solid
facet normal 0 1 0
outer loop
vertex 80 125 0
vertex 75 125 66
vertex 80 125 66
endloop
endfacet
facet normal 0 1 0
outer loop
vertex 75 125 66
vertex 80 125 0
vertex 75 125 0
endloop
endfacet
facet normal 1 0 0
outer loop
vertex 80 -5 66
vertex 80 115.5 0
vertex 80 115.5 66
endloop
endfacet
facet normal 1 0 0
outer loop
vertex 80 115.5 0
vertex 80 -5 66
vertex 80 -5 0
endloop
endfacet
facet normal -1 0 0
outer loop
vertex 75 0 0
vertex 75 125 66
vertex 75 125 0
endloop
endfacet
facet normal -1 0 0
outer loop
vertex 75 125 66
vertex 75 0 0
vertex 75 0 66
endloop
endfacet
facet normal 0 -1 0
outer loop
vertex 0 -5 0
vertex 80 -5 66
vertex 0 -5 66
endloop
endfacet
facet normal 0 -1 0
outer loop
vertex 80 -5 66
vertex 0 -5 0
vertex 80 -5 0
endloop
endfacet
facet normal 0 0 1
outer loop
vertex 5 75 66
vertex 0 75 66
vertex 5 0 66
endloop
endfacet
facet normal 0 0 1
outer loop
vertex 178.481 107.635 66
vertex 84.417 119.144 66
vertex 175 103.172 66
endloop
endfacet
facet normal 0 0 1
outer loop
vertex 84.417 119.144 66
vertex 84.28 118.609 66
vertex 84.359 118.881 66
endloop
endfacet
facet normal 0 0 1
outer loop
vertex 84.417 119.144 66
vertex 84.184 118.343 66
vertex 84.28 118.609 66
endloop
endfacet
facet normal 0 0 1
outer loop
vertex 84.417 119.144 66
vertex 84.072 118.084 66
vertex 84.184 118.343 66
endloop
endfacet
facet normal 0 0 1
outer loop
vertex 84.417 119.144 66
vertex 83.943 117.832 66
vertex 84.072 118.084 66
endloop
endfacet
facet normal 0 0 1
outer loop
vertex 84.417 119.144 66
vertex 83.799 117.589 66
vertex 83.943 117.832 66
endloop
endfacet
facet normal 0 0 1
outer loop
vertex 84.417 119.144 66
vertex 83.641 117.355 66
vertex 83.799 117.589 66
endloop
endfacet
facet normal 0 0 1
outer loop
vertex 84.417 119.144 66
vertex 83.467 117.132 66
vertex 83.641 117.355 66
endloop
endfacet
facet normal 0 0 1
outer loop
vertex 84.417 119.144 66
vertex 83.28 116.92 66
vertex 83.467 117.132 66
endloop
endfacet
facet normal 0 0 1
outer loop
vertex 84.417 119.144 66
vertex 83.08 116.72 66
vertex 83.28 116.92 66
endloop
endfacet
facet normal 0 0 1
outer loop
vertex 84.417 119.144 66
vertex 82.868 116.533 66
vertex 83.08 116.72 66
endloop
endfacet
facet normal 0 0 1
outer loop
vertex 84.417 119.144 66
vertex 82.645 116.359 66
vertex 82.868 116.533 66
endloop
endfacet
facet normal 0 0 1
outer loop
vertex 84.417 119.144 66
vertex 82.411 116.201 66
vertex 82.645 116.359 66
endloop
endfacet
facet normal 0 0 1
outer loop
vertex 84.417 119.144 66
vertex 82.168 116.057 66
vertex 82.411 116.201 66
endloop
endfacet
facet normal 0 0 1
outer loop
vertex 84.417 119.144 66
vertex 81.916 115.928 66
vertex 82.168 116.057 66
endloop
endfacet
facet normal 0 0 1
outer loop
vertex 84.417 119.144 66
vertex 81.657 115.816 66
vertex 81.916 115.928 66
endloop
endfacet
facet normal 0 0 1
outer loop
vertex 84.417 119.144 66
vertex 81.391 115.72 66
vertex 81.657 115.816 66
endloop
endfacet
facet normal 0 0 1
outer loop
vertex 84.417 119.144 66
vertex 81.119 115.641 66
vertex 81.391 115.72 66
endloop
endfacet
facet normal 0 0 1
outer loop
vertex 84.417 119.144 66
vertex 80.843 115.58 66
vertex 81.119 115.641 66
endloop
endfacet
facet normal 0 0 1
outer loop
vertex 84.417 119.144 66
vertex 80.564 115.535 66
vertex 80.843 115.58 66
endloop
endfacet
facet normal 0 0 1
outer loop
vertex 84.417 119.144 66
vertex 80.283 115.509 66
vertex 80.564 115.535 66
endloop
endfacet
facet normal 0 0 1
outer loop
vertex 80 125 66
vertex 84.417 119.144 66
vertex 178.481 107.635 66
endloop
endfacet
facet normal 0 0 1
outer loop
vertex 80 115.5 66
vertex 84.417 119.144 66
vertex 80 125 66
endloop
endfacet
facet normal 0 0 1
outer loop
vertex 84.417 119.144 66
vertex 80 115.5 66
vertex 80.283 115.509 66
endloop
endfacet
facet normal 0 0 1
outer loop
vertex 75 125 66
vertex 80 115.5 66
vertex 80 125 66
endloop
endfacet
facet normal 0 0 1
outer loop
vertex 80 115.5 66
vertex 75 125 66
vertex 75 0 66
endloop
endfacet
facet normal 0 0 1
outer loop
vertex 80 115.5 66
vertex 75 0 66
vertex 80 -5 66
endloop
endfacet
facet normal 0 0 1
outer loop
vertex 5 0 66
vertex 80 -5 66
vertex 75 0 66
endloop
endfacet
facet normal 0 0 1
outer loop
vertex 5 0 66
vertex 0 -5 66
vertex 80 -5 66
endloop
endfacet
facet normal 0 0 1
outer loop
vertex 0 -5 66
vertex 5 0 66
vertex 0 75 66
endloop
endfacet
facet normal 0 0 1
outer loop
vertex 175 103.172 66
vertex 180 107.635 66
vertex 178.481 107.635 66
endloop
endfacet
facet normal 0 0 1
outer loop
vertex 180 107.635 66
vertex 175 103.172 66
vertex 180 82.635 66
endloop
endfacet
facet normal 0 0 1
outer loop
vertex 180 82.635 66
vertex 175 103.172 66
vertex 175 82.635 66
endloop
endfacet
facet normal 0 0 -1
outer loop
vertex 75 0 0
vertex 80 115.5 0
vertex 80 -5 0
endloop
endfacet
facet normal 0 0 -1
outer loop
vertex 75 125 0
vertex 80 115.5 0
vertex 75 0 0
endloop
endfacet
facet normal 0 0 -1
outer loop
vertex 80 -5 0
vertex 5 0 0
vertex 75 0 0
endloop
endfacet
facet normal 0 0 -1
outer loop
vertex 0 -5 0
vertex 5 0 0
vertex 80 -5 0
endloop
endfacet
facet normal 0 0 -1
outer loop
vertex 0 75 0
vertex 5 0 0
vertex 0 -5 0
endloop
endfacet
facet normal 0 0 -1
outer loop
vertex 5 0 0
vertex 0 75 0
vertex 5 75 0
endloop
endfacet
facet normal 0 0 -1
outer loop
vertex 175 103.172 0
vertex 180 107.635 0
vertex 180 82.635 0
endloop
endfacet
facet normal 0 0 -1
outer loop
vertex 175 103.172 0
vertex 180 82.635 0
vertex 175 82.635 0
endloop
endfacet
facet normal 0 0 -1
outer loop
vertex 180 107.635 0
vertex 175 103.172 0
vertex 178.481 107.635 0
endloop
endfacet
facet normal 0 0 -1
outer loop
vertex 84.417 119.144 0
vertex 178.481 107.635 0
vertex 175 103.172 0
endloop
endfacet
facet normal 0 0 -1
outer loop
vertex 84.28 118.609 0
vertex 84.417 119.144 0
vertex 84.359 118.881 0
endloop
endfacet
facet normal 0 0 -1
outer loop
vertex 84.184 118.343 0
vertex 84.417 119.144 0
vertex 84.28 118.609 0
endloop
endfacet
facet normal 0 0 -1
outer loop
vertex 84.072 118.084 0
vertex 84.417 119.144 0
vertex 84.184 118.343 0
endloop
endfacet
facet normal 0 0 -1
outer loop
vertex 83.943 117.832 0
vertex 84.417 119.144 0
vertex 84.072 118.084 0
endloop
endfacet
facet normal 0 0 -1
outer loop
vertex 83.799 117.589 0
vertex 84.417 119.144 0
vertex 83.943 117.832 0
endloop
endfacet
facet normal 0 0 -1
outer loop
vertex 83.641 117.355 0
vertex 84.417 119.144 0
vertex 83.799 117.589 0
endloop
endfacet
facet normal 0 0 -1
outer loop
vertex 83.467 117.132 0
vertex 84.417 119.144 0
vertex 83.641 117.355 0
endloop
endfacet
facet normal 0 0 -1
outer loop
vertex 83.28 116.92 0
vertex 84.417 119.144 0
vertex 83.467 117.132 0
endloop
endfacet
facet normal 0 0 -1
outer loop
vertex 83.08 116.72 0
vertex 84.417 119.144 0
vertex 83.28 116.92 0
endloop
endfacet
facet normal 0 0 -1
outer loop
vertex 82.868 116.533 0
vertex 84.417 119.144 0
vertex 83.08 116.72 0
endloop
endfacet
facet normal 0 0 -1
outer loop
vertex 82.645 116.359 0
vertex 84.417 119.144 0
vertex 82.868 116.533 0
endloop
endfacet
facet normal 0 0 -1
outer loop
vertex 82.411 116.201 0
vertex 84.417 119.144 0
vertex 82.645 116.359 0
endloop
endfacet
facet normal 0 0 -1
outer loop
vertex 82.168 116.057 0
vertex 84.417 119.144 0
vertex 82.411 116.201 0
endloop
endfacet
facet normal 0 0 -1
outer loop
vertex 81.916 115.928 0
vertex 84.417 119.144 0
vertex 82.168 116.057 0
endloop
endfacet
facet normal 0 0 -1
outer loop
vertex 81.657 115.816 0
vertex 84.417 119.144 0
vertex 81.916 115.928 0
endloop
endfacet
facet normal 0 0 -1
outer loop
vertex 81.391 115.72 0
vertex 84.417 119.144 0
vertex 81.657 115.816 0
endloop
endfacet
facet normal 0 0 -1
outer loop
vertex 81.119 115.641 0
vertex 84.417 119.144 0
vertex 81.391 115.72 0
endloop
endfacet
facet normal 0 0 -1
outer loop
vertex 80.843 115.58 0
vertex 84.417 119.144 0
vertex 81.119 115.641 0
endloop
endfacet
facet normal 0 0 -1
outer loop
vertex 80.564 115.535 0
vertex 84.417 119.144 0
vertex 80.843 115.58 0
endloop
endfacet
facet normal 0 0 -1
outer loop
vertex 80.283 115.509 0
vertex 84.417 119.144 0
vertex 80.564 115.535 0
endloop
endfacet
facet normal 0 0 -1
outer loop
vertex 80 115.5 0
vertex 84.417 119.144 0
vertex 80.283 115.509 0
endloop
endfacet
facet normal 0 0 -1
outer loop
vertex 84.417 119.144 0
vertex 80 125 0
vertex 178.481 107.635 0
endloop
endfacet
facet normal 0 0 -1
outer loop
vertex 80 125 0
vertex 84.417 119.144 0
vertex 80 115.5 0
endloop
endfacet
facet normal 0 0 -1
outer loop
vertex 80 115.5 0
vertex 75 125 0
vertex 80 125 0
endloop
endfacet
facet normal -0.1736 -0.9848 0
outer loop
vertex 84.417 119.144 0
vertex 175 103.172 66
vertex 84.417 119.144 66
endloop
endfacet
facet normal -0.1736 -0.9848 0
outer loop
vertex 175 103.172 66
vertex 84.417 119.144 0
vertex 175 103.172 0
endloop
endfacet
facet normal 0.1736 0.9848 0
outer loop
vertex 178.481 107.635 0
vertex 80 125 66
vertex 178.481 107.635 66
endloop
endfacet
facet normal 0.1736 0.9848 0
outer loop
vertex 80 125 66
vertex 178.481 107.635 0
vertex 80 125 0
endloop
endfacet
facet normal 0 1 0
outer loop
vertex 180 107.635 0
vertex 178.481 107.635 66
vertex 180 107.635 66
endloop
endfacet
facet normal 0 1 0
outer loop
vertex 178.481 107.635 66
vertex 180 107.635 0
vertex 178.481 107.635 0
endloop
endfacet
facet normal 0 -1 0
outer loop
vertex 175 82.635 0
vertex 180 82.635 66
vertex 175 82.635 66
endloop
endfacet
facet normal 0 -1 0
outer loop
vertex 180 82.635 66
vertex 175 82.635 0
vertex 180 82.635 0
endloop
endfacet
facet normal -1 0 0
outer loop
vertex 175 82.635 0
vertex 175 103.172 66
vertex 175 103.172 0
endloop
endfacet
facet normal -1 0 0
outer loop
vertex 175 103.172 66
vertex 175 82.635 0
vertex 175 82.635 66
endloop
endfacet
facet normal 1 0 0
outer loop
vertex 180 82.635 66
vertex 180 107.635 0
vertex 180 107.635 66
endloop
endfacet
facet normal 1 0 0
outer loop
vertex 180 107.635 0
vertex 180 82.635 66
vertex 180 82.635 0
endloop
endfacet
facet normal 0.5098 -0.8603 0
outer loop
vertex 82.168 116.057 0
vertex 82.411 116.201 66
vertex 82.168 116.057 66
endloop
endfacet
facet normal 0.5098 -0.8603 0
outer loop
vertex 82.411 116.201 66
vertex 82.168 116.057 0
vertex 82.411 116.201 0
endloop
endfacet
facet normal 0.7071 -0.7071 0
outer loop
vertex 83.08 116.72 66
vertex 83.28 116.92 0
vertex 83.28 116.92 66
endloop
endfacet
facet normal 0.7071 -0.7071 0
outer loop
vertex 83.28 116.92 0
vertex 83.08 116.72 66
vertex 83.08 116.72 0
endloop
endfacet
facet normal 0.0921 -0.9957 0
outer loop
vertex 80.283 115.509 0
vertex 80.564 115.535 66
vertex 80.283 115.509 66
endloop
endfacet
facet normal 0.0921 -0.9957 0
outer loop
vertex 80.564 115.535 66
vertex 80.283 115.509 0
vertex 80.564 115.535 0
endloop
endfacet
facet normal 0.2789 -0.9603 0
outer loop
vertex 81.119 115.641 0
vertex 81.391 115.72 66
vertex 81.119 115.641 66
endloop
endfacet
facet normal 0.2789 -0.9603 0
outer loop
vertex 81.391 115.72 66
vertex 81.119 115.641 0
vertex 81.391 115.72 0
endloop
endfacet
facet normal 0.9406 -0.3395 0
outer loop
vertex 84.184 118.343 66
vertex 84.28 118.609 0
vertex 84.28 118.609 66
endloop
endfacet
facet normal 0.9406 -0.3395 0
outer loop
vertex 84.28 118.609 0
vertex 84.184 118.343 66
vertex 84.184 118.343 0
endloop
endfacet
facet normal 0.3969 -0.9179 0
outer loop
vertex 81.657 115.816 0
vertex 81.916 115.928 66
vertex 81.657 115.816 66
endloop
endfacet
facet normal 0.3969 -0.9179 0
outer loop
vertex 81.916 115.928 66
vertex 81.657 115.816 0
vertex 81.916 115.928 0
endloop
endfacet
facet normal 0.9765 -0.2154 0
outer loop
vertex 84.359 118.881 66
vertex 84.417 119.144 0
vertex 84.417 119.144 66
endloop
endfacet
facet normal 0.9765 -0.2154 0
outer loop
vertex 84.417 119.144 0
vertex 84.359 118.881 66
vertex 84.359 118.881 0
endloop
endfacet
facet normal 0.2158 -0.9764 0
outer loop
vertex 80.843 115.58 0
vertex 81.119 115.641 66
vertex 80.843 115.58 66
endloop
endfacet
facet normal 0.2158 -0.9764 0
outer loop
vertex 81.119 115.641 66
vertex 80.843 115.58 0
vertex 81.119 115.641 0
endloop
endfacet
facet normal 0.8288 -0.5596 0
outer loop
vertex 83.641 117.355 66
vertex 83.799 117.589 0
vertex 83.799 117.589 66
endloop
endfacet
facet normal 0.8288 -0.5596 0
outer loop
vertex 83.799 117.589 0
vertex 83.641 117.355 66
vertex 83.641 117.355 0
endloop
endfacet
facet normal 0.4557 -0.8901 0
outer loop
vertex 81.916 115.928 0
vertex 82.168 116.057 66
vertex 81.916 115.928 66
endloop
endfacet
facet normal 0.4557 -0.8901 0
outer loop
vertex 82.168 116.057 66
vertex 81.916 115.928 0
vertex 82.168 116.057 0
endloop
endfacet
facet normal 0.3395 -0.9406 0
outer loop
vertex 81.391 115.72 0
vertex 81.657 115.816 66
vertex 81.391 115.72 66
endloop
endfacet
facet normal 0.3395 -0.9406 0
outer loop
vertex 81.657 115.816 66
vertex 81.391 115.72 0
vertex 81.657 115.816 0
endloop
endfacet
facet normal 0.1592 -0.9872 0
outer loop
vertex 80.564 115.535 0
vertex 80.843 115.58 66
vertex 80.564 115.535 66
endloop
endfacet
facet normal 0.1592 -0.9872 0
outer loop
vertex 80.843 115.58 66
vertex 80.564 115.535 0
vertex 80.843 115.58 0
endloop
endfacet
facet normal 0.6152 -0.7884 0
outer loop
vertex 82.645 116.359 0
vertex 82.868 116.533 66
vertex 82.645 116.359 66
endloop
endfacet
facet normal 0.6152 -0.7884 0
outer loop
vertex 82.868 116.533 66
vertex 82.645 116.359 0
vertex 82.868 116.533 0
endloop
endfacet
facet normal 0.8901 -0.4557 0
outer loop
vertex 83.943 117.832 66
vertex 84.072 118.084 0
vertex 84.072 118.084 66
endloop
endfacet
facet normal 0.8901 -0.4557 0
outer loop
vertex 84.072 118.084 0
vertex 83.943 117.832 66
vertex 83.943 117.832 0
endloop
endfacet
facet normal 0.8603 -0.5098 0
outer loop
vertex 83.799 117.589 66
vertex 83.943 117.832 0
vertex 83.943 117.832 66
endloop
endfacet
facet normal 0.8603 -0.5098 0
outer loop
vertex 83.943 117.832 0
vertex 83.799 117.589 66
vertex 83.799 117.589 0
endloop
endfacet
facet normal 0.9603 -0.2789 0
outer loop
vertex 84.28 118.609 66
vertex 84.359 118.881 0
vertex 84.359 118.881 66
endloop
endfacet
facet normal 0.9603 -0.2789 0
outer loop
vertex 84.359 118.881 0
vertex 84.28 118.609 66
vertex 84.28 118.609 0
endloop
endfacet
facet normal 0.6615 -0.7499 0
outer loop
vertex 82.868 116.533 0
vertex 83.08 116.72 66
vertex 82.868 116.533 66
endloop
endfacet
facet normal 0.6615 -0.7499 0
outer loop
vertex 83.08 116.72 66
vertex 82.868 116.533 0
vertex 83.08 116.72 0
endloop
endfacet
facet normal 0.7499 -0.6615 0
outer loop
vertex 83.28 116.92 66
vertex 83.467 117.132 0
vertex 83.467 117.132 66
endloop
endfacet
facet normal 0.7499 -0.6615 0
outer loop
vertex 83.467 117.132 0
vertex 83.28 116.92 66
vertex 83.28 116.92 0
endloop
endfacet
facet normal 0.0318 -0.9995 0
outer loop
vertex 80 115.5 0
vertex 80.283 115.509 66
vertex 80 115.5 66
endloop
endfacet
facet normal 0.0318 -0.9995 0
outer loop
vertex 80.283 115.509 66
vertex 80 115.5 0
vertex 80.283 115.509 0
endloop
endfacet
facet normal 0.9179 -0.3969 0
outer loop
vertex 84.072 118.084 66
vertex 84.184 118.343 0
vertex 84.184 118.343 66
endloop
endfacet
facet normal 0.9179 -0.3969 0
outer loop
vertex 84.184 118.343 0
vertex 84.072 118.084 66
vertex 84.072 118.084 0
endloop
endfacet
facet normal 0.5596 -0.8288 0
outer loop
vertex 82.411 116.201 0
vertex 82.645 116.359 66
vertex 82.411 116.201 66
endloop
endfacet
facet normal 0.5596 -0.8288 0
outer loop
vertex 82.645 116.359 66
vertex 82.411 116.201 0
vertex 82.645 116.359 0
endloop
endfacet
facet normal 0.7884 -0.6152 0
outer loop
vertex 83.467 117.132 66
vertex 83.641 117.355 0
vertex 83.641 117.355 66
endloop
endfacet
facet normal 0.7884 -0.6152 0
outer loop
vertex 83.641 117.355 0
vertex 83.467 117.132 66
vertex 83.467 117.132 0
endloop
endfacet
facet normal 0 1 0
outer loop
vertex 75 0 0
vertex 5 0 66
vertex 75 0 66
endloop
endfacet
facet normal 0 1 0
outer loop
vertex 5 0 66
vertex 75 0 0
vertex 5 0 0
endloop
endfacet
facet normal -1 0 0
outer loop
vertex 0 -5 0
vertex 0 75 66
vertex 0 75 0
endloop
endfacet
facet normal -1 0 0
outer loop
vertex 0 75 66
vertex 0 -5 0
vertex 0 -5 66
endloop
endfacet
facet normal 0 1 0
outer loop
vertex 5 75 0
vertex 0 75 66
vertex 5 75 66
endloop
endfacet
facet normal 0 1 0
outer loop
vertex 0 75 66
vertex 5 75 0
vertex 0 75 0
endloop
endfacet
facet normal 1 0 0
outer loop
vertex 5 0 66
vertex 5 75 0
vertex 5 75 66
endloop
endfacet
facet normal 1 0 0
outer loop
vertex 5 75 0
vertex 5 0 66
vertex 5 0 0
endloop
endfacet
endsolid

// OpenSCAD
hookwidth = 66;		// witdh of hook
hookthick = 5;		// thickness of part
hooktop = 75;		// length of top we hang on
hooklatch = 100;		// length of overhang latch (twice as long on hanger side)
hookfront = 125;
hookback = 75;
hooktip = 25;

rotate ([90,0,0]) union () 
{
	cube ([hooktop,hookwidth,hookthick]);
	rotate ([0,90,0]) cube ([hookback,hookwidth,hookthick]);
	rotate ([0,90,0]) 
		{
			translate ([-hookthick,0,hooktop]) 
				{
					union ()
						{
							cube ([hookfront + hookthick,hookwidth,hookthick]);
							translate ([hookfront + hookthick,0,hookthick]) rotate ([0,-100,0]) cube ([hooklatch,hookwidth,hookthick]);
							translate ([hookfront - (sin(10) * hooklatch) + hookthick,0,hookthick + hooklatch]) rotate ([0,-180,0]) cube ([hooktip,hookwidth,hookthick]);
							translate ([hookfront,0,hookthick]) rotate ([-90,0,0]) cylinder (h = hookwidth, r = (hookthick / 2) + 2, $fn = 100);
						}
				}
		}
}
